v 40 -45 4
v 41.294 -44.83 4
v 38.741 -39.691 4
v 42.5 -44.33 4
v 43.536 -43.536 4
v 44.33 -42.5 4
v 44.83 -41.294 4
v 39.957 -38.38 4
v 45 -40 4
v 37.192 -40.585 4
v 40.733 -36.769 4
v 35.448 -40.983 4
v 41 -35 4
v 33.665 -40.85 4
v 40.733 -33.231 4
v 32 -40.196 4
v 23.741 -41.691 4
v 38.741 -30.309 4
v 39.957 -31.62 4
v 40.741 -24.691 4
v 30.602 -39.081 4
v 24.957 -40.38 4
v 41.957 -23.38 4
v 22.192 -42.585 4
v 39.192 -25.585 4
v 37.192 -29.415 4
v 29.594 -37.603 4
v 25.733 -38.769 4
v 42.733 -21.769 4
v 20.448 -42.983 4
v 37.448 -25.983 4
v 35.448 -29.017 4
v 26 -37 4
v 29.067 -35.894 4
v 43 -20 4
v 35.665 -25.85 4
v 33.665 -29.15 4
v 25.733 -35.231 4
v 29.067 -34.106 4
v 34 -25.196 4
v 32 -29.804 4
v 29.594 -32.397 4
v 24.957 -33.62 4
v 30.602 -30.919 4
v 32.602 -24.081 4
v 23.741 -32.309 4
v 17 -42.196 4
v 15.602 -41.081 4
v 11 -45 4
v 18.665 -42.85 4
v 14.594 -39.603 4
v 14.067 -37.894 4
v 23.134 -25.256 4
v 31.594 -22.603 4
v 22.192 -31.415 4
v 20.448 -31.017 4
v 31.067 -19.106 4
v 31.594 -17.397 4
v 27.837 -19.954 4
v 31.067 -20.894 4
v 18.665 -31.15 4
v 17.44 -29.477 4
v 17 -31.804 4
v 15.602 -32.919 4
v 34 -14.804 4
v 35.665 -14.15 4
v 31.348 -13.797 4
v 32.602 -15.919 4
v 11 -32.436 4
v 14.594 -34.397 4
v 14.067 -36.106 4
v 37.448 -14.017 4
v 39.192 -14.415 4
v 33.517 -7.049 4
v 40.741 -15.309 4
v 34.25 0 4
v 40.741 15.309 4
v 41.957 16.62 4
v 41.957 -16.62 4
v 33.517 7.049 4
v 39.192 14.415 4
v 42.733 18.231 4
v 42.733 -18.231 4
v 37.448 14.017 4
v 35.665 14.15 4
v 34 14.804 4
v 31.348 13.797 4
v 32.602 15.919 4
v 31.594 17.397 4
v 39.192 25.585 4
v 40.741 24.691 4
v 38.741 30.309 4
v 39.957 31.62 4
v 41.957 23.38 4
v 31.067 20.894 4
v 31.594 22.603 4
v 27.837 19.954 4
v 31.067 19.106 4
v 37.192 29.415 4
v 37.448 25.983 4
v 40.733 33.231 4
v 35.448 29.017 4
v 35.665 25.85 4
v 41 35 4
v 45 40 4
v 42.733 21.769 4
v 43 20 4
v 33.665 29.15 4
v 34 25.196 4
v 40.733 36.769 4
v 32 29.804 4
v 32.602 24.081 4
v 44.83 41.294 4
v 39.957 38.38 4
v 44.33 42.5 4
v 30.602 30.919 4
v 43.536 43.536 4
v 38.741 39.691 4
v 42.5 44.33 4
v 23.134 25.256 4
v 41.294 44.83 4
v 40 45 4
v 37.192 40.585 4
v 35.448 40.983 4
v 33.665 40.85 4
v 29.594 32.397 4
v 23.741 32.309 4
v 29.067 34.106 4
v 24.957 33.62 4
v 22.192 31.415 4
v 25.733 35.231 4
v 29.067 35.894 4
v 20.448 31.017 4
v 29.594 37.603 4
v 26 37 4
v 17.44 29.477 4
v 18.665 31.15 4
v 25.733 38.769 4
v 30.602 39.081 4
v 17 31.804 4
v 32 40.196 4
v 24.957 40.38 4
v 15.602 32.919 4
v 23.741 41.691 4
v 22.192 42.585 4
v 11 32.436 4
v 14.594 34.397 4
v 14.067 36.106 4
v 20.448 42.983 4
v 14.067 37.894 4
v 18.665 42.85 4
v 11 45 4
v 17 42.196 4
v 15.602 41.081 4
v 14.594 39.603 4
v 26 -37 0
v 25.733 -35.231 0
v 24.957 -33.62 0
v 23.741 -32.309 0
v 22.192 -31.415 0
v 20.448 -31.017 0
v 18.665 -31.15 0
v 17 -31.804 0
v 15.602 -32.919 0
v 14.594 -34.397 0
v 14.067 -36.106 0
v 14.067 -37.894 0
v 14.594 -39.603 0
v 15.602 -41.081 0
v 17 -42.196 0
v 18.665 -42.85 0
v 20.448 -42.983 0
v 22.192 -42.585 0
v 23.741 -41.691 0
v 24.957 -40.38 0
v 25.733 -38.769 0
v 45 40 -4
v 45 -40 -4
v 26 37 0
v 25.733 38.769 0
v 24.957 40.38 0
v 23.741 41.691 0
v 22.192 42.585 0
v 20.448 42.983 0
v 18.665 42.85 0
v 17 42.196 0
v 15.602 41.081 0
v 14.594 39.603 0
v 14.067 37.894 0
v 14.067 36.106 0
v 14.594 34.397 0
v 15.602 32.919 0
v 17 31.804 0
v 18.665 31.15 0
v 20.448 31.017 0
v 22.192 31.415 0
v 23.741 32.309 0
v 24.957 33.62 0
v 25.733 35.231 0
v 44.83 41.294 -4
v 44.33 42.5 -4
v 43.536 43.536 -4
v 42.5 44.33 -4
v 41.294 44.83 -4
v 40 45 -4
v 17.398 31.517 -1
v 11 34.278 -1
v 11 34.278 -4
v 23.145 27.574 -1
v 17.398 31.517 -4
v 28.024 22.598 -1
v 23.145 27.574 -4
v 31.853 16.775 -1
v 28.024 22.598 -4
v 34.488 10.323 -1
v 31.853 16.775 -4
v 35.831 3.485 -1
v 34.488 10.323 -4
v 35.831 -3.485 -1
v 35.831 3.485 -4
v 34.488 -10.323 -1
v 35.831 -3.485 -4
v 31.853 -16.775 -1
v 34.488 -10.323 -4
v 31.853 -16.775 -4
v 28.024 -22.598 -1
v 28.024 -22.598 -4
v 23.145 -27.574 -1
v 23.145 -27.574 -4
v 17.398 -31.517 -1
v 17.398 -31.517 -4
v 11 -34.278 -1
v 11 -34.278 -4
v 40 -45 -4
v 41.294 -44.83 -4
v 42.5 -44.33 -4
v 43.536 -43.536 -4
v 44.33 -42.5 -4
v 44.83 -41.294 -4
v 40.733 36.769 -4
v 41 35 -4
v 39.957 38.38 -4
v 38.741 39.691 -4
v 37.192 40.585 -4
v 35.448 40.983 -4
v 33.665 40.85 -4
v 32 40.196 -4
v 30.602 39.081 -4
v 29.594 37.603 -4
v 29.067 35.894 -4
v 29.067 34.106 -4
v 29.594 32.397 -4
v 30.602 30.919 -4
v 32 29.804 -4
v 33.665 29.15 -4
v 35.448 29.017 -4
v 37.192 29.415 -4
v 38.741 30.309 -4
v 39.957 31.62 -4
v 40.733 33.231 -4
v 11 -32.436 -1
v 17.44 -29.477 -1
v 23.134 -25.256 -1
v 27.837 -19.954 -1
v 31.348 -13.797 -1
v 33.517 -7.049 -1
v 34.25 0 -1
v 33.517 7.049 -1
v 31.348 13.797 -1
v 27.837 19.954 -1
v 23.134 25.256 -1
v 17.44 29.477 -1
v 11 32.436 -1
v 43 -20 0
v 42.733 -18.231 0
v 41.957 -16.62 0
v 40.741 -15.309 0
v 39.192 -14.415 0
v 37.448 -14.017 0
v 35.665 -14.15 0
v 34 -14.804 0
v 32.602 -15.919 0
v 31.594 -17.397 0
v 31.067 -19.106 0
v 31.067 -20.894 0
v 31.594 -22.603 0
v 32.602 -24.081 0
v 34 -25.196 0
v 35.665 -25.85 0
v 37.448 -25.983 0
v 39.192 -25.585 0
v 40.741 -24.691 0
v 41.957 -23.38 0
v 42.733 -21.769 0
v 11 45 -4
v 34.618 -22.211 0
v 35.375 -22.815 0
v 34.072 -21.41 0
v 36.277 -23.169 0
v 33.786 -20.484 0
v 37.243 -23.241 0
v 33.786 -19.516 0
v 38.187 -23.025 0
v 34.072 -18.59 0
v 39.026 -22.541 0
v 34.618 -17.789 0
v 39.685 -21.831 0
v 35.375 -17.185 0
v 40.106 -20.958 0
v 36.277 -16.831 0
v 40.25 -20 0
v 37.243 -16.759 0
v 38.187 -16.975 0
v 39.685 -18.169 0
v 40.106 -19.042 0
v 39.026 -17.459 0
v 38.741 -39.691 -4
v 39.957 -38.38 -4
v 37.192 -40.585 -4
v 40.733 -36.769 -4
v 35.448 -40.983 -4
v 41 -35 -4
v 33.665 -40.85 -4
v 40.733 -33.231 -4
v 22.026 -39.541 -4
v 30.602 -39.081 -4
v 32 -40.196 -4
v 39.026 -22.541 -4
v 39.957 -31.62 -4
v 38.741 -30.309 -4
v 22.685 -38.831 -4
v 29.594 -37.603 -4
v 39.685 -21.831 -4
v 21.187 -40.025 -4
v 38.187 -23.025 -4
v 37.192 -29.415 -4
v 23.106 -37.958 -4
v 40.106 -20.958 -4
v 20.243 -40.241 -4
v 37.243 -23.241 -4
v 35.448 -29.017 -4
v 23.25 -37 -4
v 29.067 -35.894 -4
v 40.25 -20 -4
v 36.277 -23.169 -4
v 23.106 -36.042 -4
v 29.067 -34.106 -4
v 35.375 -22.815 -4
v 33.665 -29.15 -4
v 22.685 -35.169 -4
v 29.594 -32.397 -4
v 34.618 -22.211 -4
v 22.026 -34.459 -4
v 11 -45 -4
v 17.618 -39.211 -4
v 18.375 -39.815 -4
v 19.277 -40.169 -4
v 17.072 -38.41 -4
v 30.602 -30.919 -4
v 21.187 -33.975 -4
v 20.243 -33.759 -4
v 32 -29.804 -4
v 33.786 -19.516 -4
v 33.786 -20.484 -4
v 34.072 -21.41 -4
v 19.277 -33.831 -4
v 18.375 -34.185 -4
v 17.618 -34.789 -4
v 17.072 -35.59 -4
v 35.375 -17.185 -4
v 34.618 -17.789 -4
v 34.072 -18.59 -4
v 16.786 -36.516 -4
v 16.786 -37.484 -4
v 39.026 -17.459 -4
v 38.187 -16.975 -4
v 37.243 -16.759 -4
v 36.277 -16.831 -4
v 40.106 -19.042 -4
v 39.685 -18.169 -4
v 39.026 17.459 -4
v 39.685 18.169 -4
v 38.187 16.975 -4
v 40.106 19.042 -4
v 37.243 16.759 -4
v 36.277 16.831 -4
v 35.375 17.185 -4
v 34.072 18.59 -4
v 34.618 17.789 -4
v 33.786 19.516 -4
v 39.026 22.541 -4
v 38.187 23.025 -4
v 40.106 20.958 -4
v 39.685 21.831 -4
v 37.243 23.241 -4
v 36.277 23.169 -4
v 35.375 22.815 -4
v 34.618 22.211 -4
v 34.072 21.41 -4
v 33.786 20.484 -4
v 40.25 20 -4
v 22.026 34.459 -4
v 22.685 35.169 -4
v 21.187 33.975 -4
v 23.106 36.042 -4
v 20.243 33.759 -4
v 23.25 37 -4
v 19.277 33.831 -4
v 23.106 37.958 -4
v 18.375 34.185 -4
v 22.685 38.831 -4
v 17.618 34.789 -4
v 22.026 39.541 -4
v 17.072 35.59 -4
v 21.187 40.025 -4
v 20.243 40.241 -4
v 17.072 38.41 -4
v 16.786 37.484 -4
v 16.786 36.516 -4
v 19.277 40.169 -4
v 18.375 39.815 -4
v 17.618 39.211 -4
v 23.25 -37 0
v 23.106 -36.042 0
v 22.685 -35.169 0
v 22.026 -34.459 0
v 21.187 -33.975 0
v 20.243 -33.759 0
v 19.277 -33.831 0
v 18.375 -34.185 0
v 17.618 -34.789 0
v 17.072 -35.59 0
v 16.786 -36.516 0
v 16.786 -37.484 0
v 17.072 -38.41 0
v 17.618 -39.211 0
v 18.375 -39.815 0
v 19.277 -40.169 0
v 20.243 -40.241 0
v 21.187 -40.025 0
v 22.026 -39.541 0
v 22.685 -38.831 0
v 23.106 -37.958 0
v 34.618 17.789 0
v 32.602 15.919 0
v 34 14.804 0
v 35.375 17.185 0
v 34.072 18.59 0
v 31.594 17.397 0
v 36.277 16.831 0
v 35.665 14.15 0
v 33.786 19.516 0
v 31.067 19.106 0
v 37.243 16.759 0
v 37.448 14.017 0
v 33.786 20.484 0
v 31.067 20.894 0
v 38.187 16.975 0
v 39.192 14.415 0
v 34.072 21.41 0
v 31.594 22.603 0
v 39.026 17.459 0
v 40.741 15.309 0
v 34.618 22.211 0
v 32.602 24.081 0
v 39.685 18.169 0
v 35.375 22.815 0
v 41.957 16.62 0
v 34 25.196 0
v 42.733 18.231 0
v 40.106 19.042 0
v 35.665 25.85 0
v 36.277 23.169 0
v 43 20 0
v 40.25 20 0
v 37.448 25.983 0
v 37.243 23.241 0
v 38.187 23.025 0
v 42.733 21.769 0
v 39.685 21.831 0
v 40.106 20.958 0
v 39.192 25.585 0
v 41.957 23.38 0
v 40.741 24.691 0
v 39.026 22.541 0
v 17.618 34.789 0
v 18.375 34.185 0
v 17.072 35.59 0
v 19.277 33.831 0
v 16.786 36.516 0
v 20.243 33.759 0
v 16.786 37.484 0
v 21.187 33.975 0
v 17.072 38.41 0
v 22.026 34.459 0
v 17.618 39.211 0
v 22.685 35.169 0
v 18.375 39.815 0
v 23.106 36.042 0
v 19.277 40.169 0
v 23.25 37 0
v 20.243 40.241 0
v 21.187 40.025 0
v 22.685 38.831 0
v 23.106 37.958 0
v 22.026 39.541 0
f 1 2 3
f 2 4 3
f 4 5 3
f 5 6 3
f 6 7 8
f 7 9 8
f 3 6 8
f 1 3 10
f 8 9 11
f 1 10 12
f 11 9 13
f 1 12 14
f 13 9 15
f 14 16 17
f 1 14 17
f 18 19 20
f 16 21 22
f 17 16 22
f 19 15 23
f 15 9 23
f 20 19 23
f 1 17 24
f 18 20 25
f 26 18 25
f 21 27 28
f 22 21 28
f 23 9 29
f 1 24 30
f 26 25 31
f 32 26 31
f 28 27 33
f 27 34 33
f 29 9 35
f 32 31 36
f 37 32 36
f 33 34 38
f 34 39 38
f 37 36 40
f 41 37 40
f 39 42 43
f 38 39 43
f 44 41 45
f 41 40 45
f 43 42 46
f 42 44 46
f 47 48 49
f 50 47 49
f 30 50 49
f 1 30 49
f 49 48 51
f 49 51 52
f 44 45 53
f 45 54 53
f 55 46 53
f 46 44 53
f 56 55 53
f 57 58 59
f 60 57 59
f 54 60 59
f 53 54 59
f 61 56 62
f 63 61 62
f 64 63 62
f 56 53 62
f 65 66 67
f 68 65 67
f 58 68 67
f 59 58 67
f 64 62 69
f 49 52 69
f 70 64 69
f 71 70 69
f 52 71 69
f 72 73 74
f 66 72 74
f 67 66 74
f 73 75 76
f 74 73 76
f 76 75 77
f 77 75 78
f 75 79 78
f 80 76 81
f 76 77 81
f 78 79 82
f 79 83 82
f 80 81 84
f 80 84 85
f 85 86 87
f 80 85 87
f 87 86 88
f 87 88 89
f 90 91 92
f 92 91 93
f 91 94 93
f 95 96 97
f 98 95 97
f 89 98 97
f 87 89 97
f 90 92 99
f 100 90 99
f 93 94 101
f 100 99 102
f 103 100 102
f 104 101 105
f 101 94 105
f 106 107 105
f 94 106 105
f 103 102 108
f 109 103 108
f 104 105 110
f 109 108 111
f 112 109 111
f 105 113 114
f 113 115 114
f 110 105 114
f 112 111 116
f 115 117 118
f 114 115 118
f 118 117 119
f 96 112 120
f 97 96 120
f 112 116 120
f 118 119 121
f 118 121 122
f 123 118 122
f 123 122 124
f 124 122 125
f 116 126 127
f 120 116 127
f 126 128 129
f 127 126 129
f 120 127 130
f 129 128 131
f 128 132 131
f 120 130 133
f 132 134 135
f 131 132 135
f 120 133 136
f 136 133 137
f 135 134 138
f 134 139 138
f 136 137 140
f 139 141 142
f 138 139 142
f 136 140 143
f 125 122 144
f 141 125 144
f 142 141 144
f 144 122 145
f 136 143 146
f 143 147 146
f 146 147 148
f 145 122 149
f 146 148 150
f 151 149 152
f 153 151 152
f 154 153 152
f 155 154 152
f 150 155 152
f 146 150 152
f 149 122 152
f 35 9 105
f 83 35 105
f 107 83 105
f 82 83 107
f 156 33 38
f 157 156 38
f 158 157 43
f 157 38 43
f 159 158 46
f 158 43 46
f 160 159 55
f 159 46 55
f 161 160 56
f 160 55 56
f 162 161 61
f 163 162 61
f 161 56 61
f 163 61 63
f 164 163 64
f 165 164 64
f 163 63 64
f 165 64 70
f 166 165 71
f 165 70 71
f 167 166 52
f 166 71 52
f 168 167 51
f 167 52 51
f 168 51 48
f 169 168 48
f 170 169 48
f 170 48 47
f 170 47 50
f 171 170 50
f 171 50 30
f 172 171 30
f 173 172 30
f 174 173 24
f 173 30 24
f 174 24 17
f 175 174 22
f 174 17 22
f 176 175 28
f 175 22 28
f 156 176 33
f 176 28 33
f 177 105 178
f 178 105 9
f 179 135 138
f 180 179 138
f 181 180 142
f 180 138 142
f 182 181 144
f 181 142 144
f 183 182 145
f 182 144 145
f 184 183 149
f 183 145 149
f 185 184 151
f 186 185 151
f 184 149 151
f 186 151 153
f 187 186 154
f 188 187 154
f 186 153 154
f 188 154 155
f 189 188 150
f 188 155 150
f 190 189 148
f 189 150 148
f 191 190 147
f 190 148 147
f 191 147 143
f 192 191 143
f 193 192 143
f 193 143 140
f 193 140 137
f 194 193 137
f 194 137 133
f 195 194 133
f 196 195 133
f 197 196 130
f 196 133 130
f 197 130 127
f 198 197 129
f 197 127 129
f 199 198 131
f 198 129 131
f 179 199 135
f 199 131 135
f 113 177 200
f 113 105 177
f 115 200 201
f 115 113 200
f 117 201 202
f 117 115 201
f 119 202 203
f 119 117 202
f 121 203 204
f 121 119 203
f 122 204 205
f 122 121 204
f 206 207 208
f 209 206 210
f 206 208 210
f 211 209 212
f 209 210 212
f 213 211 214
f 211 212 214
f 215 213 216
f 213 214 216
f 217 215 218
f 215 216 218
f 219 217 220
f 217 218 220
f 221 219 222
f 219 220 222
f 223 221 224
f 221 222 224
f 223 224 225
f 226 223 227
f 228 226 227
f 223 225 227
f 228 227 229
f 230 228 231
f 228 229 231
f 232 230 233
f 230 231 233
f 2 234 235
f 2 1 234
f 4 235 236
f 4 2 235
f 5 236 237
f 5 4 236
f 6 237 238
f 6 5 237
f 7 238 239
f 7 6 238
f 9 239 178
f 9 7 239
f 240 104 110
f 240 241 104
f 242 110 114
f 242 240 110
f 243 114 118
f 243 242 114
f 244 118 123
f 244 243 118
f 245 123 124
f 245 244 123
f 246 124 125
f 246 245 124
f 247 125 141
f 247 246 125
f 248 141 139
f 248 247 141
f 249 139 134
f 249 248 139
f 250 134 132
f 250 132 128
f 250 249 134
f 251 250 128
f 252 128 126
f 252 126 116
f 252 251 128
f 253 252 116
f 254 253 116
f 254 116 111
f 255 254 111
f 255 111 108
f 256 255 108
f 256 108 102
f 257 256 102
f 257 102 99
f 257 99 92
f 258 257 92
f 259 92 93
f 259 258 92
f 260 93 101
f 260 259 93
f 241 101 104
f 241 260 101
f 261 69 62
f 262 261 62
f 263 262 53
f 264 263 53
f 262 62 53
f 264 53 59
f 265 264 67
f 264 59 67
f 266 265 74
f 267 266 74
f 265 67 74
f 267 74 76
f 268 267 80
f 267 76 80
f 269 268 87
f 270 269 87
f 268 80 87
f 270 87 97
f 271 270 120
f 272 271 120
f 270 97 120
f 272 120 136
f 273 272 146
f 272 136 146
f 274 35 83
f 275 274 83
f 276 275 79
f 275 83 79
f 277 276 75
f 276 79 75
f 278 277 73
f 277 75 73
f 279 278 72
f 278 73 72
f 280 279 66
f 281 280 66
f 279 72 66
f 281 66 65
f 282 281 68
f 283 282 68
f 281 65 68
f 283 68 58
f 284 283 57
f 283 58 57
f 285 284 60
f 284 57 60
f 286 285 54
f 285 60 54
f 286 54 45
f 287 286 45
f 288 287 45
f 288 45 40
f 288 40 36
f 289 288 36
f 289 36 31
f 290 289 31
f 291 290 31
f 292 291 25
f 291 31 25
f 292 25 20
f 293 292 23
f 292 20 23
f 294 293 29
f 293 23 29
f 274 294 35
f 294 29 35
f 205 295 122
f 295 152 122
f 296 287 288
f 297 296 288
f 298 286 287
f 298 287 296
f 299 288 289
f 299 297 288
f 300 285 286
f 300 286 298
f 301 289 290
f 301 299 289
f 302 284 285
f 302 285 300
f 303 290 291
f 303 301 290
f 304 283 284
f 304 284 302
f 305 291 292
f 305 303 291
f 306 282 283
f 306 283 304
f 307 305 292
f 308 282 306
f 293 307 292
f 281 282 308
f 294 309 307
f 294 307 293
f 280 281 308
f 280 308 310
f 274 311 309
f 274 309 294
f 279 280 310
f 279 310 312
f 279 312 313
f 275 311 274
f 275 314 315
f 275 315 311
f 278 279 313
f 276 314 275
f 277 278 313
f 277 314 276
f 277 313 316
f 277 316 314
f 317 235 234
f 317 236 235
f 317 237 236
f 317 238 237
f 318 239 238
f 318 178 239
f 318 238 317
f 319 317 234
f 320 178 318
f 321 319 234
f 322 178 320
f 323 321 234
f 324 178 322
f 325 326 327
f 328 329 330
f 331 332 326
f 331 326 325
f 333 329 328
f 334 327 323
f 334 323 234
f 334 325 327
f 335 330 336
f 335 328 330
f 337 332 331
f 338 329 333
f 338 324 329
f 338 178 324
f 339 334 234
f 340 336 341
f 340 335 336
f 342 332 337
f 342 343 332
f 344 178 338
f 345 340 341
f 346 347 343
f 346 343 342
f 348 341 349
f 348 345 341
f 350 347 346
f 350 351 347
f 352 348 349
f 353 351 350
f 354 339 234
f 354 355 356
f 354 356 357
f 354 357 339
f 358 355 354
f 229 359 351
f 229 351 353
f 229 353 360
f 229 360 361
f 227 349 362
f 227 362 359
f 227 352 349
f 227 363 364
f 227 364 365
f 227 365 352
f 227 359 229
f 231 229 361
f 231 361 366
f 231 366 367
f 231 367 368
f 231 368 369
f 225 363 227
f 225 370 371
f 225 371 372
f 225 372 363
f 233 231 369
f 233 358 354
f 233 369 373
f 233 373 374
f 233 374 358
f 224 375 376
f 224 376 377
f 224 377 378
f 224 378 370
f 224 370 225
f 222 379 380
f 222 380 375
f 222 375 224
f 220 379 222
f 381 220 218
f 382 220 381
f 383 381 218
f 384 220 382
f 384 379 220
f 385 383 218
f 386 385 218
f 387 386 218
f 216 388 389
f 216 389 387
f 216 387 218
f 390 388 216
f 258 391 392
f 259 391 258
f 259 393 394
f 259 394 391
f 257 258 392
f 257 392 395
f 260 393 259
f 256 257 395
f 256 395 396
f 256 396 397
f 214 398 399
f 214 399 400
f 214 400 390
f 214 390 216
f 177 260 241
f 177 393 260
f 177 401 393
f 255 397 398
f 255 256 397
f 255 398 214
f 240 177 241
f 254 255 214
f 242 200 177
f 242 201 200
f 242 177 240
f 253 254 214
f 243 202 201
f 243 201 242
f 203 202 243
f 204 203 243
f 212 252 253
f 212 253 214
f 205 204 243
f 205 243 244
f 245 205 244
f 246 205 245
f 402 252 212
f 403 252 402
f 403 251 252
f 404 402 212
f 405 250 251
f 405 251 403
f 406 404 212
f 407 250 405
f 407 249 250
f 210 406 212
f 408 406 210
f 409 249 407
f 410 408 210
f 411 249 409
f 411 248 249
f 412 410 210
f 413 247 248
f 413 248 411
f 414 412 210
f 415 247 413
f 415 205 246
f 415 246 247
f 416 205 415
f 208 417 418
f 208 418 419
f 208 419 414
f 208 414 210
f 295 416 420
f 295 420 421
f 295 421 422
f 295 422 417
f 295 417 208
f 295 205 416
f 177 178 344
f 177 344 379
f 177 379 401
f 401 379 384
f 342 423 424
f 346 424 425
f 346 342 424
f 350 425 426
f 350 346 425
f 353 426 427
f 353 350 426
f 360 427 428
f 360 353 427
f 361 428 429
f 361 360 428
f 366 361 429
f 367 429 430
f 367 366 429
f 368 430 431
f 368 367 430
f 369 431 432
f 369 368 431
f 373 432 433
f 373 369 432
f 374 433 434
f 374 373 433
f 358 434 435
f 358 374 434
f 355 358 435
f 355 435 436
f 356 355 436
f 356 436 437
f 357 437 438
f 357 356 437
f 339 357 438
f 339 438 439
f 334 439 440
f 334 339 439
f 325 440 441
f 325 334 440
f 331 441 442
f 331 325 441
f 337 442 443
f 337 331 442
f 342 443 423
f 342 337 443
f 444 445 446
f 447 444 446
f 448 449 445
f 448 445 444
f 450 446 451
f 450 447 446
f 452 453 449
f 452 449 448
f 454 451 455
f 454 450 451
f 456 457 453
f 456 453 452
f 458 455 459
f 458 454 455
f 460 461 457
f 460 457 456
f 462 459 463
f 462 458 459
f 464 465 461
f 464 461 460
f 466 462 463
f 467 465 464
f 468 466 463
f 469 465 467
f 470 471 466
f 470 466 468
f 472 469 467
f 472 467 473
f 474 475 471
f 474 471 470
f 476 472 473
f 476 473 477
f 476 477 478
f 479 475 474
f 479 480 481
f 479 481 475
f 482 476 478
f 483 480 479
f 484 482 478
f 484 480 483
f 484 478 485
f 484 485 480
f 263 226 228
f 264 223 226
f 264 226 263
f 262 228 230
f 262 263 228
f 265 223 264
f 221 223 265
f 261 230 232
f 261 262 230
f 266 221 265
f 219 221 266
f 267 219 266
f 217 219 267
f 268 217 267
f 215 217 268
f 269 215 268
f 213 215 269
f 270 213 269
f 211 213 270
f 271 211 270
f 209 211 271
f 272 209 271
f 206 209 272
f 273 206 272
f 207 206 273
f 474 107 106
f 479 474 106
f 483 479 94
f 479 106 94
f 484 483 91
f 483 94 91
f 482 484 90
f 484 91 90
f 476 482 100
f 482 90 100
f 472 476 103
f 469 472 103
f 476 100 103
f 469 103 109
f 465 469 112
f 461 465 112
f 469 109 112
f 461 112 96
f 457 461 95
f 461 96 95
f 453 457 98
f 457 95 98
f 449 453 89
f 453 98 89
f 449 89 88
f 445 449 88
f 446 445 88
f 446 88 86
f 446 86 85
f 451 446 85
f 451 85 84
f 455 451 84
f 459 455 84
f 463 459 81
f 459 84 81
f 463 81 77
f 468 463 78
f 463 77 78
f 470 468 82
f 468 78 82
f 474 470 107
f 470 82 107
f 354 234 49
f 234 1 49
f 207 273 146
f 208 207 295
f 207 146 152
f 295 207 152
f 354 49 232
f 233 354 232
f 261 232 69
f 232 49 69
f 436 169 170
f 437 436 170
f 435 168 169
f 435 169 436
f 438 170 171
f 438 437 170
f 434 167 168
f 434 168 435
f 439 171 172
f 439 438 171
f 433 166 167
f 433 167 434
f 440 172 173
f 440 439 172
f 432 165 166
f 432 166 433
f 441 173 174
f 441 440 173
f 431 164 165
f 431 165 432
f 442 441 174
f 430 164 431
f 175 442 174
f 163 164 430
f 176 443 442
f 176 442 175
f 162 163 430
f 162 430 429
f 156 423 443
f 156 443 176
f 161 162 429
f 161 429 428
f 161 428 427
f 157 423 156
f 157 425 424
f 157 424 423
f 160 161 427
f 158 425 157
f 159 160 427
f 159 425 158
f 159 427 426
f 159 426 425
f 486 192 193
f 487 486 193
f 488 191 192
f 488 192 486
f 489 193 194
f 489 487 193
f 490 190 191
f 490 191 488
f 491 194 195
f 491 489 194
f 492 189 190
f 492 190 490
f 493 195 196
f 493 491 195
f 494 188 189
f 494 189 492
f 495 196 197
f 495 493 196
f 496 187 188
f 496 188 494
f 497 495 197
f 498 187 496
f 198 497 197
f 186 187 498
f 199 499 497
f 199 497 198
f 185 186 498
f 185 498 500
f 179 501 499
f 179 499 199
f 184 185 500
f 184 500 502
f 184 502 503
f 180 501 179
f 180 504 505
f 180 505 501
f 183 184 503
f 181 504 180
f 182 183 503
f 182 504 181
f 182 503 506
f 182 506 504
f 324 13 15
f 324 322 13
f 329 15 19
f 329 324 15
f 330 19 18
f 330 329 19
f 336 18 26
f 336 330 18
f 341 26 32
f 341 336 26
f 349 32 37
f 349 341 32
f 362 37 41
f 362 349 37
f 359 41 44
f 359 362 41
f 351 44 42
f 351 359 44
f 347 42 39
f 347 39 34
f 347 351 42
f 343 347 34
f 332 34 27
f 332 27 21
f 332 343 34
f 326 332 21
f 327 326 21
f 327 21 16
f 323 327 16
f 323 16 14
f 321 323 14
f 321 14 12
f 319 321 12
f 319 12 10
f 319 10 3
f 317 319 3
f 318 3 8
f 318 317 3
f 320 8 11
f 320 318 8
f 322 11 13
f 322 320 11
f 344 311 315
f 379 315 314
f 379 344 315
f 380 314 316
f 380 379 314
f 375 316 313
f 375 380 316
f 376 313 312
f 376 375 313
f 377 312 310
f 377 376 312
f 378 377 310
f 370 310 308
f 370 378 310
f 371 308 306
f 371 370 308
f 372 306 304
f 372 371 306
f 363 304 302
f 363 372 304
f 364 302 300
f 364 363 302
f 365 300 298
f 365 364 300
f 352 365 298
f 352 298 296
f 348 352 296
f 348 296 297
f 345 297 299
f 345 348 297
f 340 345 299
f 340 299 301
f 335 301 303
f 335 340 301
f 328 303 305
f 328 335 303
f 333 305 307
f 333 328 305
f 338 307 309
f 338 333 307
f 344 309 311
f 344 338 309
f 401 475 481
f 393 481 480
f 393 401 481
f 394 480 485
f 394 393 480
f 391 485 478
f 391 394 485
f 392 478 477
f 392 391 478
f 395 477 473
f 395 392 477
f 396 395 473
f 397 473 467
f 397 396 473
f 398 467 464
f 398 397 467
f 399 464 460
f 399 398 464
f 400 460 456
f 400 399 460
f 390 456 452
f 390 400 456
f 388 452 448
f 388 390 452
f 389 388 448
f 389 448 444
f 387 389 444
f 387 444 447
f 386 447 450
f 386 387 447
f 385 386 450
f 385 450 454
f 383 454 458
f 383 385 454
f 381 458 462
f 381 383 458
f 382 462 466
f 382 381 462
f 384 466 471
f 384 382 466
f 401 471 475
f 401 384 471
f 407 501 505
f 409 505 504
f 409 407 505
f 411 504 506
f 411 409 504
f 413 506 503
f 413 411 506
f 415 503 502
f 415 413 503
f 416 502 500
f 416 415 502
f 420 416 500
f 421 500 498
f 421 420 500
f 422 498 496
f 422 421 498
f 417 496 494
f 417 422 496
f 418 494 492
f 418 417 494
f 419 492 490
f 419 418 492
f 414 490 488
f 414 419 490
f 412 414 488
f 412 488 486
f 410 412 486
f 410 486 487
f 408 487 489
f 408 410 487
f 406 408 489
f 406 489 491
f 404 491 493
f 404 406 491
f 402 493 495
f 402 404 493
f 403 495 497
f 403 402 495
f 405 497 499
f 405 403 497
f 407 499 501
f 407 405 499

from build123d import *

# Parameters (mm, degrees)
SKETCH1_R           = 3.25
SKETCH1_R_2         = 6
BOSS_EXTRUDE1_DEPTH = 4
SKETCH3_R           = 36
CUT_EXTRUDE2_DEPTH  = 3
FILLET1_R           = 5
SKETCH4_R           = 6
CUT_EXTRUDE3_DEPTH  = 4


with BuildPart() as part:
    # Sketch1 → Boss-Extrude1 (new body, symmetric)
    with BuildSketch(Plane.XY):
        with BuildLine():
            Line((45, -45), (11, -45))
            Line((11, -45), (11, -32.435512945))
            ThreePointArc((11, -32.435512945), (34.25, 0), (11, 32.435512945))
            Line((11, 32.435512945), (11, 45))
            Line((11, 45), (45, 45))
            Line((45, 45), (45, -45))
        make_face()
        with Locations((20, 37)):
            Circle(SKETCH1_R, mode=Mode.SUBTRACT)
        with Locations((35, 35)):
            Circle(SKETCH1_R_2, mode=Mode.SUBTRACT)
        with Locations((37, 20)):
            Circle(SKETCH1_R, mode=Mode.SUBTRACT)
        with Locations((37, -20)):
            Circle(SKETCH1_R, mode=Mode.SUBTRACT)
        with Locations((35, -35)):
            Circle(SKETCH1_R_2, mode=Mode.SUBTRACT)
        with Locations((20, -37)):
            Circle(SKETCH1_R, mode=Mode.SUBTRACT)
    extrude(amount=BOSS_EXTRUDE1_DEPTH, both=True)

    # Sketch3 → Cut-Extrude2 (cut)
    with BuildSketch(Plane(origin=(0, 0, -4), x_dir=(-1, 0, 0), z_dir=(0, 0, -1))):
        Circle(SKETCH3_R)
    extrude(amount=-CUT_EXTRUDE2_DEPTH, mode=Mode.SUBTRACT)

    # Fillet1
    fillet1_edges = [part.edges().sort_by_distance(p)[0] for p in [
        (45, 45, 0),
        (45, -45, 0),
    ]]
    fillet(fillet1_edges, radius=FILLET1_R)

    # Sketch4 → Cut-Extrude3 (cut)
    with BuildSketch(Plane.XY.offset(4)):
        with Locations((20, 37)):
            Circle(SKETCH4_R)
        with Locations((37, 20)):
            Circle(SKETCH4_R)
        with Locations((20, -37)):
            Circle(SKETCH4_R)
        with Locations((37, -20)):
            Circle(SKETCH4_R)
    extrude(amount=-CUT_EXTRUDE3_DEPTH, mode=Mode.SUBTRACT)


solid = part.part
